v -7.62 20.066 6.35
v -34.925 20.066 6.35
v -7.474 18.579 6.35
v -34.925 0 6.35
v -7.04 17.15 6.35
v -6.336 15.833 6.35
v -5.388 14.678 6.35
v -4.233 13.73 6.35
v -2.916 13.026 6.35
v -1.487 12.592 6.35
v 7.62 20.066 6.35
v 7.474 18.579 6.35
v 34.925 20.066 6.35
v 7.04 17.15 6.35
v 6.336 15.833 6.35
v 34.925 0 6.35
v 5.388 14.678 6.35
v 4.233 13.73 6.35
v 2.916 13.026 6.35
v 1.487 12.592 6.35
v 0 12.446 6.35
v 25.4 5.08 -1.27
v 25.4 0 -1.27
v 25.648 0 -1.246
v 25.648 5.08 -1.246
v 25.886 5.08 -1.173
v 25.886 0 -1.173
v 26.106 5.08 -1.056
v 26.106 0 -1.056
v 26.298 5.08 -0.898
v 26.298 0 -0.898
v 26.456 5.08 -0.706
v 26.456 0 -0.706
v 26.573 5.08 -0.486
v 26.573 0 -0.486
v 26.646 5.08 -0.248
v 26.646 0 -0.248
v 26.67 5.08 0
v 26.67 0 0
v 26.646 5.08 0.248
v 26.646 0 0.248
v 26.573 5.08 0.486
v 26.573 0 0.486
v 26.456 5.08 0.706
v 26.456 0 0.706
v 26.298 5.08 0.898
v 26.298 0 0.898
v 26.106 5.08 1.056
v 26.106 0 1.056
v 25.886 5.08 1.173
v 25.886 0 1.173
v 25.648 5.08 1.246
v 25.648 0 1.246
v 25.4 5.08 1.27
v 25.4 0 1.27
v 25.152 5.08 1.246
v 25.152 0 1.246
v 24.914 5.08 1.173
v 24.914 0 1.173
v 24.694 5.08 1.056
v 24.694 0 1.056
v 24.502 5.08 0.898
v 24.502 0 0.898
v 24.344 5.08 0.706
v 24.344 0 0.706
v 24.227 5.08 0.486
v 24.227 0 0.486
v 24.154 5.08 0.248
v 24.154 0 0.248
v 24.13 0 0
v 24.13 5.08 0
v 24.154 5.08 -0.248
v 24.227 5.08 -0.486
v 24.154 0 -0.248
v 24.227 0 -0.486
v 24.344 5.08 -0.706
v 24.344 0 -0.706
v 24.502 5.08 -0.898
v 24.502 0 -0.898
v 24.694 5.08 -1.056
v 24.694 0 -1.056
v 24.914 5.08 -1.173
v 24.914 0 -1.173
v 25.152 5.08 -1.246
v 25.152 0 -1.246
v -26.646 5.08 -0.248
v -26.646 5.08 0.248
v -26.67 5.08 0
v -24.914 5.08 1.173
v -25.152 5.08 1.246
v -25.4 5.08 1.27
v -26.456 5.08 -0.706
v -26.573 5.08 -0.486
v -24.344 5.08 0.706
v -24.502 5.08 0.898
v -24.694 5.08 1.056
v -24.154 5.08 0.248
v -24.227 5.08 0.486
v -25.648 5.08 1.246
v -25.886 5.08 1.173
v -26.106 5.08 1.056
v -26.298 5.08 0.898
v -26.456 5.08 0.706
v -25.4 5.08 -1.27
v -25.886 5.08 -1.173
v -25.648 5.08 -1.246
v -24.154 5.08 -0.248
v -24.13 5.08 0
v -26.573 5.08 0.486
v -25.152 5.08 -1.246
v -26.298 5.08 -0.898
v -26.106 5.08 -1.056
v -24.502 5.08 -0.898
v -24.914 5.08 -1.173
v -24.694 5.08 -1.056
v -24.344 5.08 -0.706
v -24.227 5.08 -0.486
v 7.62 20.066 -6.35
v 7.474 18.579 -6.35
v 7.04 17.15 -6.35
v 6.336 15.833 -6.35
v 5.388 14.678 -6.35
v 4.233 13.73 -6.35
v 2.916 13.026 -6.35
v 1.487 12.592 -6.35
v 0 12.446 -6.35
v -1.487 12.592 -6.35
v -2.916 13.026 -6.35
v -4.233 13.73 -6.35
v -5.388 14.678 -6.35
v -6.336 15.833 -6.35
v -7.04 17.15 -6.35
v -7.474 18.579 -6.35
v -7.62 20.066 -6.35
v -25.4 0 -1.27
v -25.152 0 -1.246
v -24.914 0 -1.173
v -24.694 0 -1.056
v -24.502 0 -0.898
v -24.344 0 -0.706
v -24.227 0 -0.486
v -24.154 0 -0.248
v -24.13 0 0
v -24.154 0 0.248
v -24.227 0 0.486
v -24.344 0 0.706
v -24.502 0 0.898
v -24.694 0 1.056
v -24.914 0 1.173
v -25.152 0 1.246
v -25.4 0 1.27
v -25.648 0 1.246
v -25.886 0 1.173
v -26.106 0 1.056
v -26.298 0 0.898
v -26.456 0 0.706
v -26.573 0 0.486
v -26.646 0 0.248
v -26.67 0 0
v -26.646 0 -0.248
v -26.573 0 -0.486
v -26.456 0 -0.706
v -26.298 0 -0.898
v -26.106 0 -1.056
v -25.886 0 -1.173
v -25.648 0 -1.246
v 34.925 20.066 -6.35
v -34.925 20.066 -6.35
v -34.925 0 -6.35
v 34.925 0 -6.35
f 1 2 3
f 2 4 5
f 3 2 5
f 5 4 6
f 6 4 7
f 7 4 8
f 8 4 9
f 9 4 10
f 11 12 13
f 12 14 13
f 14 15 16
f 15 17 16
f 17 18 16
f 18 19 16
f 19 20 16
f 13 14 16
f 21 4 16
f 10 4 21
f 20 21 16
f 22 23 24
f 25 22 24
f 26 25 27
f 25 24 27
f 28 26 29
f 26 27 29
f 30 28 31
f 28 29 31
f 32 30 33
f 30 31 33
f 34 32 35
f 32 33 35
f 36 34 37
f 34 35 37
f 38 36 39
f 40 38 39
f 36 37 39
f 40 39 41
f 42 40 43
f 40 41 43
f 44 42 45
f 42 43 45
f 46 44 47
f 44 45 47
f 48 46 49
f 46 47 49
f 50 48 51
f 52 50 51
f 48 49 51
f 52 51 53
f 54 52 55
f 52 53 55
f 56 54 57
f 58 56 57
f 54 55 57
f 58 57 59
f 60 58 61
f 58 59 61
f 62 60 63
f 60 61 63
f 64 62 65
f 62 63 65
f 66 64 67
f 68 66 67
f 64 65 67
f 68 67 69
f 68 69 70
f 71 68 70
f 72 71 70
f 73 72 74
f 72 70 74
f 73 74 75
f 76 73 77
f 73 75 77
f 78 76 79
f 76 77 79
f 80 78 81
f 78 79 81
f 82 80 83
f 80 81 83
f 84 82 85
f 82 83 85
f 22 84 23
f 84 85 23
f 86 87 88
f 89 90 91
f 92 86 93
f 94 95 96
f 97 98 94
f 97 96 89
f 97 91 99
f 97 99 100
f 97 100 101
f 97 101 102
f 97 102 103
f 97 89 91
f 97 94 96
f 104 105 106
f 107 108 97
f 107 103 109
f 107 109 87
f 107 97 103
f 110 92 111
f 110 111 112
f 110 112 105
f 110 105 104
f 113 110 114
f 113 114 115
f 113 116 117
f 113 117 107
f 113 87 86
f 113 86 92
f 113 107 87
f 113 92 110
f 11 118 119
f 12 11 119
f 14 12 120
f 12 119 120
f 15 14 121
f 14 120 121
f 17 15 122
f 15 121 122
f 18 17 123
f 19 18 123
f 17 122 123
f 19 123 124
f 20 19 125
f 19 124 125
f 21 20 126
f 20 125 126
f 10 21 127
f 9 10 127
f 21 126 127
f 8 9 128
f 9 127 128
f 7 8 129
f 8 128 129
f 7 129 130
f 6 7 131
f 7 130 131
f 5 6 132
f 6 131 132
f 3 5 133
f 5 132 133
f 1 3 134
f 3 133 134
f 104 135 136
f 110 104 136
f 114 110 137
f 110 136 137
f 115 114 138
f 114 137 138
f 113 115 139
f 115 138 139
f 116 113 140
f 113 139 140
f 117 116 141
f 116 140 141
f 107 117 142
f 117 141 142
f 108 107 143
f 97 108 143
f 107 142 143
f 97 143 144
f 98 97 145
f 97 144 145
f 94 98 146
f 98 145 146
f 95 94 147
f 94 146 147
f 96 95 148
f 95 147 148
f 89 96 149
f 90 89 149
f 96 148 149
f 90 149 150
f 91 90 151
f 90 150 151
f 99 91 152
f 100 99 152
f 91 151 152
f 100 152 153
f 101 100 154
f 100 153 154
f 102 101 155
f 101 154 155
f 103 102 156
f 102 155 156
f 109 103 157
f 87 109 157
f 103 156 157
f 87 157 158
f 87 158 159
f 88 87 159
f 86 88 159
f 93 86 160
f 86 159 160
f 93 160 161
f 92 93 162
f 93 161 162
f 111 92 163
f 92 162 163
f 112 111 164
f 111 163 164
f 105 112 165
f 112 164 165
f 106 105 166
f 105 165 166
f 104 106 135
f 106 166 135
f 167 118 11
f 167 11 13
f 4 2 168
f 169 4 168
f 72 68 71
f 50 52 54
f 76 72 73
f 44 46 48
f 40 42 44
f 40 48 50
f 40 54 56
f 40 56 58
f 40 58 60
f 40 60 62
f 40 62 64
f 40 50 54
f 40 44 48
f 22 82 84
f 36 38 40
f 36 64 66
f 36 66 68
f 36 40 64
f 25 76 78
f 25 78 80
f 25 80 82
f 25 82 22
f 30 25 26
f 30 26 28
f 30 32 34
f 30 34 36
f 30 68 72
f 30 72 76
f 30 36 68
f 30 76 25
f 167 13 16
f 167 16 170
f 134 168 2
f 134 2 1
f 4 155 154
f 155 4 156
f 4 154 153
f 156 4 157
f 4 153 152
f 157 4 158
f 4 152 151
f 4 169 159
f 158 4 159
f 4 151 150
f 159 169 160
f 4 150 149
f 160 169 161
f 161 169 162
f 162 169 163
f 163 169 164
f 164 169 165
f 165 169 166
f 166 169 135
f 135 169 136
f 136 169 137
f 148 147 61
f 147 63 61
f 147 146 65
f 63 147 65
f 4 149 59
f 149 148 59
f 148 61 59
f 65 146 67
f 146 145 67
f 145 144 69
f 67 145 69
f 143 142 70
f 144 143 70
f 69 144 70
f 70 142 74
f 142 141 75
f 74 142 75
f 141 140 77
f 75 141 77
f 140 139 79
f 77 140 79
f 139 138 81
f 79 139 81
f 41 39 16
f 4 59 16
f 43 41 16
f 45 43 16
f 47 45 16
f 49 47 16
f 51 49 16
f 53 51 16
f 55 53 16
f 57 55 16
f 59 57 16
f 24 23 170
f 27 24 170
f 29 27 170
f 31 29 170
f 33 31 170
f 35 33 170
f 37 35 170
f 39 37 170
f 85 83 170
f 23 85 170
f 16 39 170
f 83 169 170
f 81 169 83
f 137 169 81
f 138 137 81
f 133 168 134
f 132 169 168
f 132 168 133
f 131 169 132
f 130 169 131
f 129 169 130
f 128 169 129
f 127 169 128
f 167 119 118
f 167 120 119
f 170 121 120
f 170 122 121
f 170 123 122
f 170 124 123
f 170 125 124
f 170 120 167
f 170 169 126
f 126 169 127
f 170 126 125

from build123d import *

# Parameters (mm, degrees)
SKETCH1_W           = 69.85
SKETCH1_H           = 12.7
BOSS_EXTRUDE1_DEPTH = 20.066
SKETCH3_R           = 7.62
CUT_EXTRUDE3_DEPTH  = 25.4
SKETCH4_R           = 1.27
CUT_EXTRUDE4_DEPTH  = 5.08


with BuildPart() as part:
    # Sketch1 → Boss-Extrude1 (new body)
    with BuildSketch(Plane(origin=(0, 0, 0), x_dir=(1, 0, 0), z_dir=(0, 1, 0))):
        Rectangle(SKETCH1_W, SKETCH1_H)
    extrude(amount=BOSS_EXTRUDE1_DEPTH)

    # Sketch3 → Cut-Extrude3 (cut)
    with BuildSketch(Plane(origin=(0, 0, -6.35), x_dir=(-1, 0, 0), z_dir=(0, 0, -1))):
        with Locations((0, 20.066)):
            Circle(SKETCH3_R)
    extrude(amount=-CUT_EXTRUDE3_DEPTH, mode=Mode.SUBTRACT)

    # Sketch4 → Cut-Extrude4 (cut)
    with BuildSketch(Plane(origin=(0, 0, 0), x_dir=(-1, 0, 0), z_dir=(0, -1, 0))):
        with Locations(Location((25.4, 0, 0), (0, 0, 90))):
            Circle(SKETCH4_R)
        with Locations(Location((-25.4, 0, 0), (0, 0, 90))):
            Circle(SKETCH4_R)
    extrude(amount=-CUT_EXTRUDE4_DEPTH, mode=Mode.SUBTRACT)


solid = part.part
